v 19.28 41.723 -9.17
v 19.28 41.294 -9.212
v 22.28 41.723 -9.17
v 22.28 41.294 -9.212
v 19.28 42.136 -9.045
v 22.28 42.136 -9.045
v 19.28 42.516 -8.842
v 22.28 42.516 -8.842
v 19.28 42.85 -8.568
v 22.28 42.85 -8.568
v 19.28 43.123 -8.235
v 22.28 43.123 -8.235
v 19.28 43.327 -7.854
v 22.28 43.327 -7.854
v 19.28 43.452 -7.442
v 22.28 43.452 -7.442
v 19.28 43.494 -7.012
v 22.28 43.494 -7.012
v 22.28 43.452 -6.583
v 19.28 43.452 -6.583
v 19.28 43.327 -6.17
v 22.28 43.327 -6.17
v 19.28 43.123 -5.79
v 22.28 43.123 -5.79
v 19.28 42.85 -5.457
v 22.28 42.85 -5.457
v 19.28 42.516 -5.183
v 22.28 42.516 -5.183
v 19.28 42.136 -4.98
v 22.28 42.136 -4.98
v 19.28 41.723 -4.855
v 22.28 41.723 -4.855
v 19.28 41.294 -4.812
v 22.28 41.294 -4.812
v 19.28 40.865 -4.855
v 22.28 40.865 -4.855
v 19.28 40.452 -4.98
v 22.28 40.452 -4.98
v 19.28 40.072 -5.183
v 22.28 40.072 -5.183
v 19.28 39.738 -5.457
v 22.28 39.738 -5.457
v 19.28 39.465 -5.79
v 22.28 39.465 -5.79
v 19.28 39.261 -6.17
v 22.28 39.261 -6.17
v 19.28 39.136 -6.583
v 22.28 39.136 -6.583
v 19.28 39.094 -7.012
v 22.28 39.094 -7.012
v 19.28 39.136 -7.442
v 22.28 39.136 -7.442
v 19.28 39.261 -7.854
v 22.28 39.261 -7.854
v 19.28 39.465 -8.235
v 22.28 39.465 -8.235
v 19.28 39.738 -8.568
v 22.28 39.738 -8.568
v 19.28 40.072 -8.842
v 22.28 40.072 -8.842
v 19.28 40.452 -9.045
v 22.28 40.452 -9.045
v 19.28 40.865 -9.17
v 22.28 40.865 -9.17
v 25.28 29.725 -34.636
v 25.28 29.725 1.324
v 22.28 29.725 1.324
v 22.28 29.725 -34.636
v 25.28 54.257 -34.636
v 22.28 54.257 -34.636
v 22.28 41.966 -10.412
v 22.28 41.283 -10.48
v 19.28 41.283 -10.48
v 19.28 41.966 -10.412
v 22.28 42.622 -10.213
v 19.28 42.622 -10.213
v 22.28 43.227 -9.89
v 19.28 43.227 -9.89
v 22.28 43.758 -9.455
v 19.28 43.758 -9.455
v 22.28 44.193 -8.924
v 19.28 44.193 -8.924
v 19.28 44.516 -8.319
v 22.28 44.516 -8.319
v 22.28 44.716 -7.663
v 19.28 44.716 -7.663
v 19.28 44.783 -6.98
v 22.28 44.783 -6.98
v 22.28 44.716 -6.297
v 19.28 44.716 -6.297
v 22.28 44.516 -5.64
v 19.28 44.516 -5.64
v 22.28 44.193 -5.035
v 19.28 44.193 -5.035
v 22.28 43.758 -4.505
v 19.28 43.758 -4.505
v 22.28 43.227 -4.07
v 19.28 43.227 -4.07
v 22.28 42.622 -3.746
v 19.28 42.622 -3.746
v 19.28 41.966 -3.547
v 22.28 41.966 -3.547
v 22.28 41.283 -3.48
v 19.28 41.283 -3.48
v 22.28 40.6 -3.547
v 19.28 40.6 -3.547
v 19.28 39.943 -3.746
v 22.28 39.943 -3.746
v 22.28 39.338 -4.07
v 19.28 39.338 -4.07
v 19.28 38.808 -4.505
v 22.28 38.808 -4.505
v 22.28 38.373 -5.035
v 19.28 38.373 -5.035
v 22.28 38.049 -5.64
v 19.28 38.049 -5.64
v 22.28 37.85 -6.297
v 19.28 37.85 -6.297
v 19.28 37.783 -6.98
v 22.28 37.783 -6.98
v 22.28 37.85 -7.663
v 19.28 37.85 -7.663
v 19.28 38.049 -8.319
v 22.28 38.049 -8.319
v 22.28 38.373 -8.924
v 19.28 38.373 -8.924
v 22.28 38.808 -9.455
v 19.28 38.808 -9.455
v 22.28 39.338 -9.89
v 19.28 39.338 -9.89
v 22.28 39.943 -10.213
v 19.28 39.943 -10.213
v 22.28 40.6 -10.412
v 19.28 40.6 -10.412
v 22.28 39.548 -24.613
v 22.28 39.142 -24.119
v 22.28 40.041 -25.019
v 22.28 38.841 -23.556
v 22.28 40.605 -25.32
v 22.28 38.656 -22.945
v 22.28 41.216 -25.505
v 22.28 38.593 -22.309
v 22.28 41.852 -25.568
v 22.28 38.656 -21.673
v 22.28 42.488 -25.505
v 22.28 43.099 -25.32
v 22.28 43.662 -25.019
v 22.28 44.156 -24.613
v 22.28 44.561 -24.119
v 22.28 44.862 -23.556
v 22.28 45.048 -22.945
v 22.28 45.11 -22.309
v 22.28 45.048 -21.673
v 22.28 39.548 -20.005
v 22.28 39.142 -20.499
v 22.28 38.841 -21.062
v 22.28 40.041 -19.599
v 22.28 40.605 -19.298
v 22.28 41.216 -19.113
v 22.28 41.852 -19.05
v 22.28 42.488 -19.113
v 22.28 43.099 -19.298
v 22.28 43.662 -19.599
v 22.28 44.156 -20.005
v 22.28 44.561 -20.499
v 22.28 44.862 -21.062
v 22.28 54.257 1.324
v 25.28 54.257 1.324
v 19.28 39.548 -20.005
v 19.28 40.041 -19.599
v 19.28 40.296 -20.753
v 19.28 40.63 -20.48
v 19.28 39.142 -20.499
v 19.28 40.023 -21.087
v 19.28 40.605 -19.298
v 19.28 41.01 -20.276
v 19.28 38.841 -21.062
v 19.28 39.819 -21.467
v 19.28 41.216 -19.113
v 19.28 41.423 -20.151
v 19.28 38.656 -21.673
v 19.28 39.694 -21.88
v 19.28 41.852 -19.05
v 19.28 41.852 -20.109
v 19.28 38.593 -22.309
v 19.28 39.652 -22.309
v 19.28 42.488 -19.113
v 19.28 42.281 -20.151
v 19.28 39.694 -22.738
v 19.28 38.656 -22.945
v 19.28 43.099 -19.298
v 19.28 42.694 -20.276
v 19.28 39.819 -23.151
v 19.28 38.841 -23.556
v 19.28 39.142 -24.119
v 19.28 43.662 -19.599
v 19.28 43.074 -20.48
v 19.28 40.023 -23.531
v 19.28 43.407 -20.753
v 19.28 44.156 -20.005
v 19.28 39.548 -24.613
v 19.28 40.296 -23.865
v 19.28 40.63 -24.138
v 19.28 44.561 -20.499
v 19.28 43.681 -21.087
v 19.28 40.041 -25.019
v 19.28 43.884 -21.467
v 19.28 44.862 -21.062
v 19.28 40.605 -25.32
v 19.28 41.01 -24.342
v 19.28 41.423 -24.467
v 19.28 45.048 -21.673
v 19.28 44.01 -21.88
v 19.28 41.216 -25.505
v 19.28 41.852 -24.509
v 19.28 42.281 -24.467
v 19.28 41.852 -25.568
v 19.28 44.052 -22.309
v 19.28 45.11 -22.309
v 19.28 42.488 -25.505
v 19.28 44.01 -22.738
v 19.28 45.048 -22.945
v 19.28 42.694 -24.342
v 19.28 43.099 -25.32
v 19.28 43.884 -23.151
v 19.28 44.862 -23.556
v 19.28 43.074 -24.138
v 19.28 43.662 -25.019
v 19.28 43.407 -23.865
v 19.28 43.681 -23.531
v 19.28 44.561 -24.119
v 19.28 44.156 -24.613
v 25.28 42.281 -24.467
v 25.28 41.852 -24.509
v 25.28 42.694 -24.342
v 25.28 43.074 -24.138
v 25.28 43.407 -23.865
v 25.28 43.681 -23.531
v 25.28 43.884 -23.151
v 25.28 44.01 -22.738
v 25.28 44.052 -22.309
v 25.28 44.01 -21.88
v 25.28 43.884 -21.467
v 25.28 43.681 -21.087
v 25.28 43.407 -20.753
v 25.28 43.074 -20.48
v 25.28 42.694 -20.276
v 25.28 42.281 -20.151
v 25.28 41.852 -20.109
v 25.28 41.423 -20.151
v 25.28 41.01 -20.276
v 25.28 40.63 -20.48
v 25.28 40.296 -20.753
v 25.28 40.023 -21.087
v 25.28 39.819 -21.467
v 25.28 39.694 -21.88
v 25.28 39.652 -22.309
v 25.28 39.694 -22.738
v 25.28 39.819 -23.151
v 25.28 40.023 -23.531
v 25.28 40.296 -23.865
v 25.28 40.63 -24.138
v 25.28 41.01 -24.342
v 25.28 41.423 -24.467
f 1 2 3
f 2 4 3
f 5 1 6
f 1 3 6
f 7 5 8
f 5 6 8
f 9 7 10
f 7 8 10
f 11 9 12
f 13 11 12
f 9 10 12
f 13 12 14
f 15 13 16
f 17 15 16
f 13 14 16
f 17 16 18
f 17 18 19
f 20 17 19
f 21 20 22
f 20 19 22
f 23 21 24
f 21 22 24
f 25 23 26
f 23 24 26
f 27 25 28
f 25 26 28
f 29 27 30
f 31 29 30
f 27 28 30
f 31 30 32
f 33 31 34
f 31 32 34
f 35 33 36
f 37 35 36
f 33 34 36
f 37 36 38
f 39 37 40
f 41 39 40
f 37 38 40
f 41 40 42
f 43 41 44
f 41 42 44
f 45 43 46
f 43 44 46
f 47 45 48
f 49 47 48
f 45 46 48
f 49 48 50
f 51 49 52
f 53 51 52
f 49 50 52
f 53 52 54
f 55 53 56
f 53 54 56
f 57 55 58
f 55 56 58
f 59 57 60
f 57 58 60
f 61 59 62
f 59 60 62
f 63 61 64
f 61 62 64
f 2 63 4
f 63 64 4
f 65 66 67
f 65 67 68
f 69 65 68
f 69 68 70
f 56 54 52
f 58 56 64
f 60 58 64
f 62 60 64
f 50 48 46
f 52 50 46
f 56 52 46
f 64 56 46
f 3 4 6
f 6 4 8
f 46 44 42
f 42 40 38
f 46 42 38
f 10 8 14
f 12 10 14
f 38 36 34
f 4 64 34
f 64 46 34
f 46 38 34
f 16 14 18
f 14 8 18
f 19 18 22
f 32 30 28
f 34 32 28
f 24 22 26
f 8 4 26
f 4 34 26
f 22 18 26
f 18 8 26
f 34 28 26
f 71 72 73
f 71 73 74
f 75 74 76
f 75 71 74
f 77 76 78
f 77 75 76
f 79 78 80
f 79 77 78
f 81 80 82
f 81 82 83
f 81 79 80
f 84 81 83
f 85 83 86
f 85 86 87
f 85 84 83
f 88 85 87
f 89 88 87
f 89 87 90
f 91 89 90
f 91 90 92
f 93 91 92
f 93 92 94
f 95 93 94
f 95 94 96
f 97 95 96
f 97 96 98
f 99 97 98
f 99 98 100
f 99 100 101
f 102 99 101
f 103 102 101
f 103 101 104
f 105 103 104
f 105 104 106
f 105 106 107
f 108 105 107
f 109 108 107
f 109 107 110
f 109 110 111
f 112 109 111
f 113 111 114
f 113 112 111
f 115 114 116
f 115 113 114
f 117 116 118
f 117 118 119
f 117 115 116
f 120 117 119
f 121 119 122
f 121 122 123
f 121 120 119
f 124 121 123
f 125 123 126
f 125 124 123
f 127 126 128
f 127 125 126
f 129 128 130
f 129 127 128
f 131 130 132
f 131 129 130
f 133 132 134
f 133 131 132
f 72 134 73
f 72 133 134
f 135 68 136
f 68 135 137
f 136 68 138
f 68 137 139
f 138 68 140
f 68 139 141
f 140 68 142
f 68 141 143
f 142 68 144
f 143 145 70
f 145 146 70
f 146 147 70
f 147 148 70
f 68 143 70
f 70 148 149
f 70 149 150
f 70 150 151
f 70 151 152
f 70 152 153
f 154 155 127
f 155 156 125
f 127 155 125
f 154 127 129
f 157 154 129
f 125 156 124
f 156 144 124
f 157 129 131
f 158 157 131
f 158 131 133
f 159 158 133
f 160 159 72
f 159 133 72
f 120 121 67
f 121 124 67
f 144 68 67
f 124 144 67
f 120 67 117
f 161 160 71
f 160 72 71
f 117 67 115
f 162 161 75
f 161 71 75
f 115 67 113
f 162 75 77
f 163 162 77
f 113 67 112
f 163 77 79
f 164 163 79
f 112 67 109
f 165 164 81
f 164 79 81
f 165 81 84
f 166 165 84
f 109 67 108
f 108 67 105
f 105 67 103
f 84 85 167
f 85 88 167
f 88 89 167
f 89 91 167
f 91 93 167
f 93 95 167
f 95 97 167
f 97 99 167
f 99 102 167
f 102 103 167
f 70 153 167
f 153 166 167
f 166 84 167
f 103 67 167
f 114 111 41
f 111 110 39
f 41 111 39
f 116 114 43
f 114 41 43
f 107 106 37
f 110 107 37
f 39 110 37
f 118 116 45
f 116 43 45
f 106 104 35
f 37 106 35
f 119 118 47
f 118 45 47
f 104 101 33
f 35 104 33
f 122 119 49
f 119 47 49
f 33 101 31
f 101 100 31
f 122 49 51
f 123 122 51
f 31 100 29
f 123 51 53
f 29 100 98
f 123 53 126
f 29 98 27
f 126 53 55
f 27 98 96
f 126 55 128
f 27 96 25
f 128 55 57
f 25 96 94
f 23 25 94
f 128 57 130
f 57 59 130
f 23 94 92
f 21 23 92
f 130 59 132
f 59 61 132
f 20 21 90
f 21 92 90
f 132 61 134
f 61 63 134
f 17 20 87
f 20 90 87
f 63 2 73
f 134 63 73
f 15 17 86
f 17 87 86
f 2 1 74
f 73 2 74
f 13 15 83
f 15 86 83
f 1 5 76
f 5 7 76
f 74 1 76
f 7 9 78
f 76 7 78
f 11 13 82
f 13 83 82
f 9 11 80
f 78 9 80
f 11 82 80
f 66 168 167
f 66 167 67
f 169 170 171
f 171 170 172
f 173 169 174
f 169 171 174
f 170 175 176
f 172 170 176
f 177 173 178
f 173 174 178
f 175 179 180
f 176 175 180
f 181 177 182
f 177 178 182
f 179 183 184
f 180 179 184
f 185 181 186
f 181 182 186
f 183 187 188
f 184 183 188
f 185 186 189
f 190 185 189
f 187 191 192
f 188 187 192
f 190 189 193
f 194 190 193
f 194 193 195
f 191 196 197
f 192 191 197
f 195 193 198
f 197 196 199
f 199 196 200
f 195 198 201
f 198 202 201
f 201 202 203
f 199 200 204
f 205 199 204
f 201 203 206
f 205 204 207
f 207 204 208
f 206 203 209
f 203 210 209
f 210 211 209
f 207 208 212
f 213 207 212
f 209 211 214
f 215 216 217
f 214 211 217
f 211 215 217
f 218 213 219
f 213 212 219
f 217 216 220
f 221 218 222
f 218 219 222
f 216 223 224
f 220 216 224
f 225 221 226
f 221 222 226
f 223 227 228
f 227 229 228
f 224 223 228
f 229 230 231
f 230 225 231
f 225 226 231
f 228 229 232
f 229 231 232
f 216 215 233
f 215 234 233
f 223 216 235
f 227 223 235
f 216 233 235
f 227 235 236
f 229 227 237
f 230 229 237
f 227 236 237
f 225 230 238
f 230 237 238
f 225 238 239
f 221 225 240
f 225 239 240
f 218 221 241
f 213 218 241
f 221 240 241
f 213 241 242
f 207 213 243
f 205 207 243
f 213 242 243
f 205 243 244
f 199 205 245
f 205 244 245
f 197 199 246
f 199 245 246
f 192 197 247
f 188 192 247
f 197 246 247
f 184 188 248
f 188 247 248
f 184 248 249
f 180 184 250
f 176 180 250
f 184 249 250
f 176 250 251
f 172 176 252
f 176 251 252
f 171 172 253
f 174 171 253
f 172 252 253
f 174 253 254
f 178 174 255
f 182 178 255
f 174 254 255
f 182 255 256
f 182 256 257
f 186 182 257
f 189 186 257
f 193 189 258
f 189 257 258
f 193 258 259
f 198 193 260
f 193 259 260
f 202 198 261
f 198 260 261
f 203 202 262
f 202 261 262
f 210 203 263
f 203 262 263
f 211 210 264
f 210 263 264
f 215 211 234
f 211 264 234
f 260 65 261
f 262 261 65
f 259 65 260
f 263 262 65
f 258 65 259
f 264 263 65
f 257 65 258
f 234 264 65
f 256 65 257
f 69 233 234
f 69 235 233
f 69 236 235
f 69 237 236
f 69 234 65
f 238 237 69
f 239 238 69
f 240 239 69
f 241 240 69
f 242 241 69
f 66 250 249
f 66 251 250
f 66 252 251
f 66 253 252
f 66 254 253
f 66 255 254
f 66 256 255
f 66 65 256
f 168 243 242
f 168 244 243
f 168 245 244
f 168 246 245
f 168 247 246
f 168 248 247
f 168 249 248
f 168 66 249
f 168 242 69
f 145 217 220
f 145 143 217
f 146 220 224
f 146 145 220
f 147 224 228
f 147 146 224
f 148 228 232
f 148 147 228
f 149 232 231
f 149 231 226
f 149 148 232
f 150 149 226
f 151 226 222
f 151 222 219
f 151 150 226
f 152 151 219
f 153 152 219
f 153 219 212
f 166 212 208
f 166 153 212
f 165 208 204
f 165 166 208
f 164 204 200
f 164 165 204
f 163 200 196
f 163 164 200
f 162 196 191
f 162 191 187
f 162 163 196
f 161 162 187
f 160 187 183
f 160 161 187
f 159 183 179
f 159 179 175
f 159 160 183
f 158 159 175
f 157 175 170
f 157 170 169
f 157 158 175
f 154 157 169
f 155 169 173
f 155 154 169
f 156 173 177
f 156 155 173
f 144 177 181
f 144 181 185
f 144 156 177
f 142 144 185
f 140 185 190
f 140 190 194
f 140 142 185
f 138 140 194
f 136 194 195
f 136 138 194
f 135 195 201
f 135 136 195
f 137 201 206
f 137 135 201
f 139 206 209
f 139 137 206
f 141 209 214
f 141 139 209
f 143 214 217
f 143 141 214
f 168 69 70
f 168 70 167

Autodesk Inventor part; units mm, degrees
ref_plane "YZ Plane" through (0, 0, 0) normal (1, 0, 0) x (0, 1, 0)
ref_plane "XZ Plane" through (0, 0, 0) normal (0, 1, 0) x (-1, 0, 0)
ref_plane "Work Plane1" through (25.2802, 41.8518, -22.309) normal (1, 0, 0) x (0, 1, 0)
sketch "Sketch1" plane through (25.2802, 41.8518, -22.309) normal (1, 0, 0) x (0, 1, 0)
  line L0 (12.4048, 23.6333) -> (-12.1268, 23.6333) projected
  line L1 (-12.1268, 23.6333) -> (-12.1268, -12.3269) projected
  line L2 (12.4048, -12.3269) -> (12.4048, 23.6333) projected
  line L3 (-12.1268, -12.3269) -> (12.4048, -12.3269) projected
  circle A0 centre (0, 0) radius 2.2
  circle A1 centre (-0.5578, 15.2966) radius 2.2
  line L4 (12.4048, 23.6333) -> (-12.1268, 23.6333)
  line L5 (-12.1268, 23.6333) -> (-12.1268, -12.3269)
  line L6 (-12.1268, -12.3269) -> (12.4048, -12.3269)
  line L7 (12.4048, -12.3269) -> (12.4048, 23.6333)
  circle A2 centre (-0.569, 15.3293) radius 3.5 projected
  circle A3 centre (0, 0) radius 3.2587 projected
  point P0 (-41.8518, 22.309)
extrude "Extrusion1" add sketch "Sketch1" against normal blind 3 contours L2 L3 L1 L0 | A1
sketch "Sketch2" plane through (25.2802, 41.8518, -22.309) normal (1, 0, 0) x (0, 0, -1)
  circle A0 centre (-15.2966, -0.5578) radius 2.2
  circle A1 centre (0, 0) radius 2.2
  circle A2 centre (-15.3293, -0.569) radius 3.5 projected
  circle A3 centre (-15.3293, -0.569) radius 3.5
  circle A4 centre (0, 0) radius 3.2587
  point P0 (-22.309, -41.8518)
extrude "Extrusion2" add sketch "Sketch2" against normal blind 6
properties part number "GearBoxLid2"
